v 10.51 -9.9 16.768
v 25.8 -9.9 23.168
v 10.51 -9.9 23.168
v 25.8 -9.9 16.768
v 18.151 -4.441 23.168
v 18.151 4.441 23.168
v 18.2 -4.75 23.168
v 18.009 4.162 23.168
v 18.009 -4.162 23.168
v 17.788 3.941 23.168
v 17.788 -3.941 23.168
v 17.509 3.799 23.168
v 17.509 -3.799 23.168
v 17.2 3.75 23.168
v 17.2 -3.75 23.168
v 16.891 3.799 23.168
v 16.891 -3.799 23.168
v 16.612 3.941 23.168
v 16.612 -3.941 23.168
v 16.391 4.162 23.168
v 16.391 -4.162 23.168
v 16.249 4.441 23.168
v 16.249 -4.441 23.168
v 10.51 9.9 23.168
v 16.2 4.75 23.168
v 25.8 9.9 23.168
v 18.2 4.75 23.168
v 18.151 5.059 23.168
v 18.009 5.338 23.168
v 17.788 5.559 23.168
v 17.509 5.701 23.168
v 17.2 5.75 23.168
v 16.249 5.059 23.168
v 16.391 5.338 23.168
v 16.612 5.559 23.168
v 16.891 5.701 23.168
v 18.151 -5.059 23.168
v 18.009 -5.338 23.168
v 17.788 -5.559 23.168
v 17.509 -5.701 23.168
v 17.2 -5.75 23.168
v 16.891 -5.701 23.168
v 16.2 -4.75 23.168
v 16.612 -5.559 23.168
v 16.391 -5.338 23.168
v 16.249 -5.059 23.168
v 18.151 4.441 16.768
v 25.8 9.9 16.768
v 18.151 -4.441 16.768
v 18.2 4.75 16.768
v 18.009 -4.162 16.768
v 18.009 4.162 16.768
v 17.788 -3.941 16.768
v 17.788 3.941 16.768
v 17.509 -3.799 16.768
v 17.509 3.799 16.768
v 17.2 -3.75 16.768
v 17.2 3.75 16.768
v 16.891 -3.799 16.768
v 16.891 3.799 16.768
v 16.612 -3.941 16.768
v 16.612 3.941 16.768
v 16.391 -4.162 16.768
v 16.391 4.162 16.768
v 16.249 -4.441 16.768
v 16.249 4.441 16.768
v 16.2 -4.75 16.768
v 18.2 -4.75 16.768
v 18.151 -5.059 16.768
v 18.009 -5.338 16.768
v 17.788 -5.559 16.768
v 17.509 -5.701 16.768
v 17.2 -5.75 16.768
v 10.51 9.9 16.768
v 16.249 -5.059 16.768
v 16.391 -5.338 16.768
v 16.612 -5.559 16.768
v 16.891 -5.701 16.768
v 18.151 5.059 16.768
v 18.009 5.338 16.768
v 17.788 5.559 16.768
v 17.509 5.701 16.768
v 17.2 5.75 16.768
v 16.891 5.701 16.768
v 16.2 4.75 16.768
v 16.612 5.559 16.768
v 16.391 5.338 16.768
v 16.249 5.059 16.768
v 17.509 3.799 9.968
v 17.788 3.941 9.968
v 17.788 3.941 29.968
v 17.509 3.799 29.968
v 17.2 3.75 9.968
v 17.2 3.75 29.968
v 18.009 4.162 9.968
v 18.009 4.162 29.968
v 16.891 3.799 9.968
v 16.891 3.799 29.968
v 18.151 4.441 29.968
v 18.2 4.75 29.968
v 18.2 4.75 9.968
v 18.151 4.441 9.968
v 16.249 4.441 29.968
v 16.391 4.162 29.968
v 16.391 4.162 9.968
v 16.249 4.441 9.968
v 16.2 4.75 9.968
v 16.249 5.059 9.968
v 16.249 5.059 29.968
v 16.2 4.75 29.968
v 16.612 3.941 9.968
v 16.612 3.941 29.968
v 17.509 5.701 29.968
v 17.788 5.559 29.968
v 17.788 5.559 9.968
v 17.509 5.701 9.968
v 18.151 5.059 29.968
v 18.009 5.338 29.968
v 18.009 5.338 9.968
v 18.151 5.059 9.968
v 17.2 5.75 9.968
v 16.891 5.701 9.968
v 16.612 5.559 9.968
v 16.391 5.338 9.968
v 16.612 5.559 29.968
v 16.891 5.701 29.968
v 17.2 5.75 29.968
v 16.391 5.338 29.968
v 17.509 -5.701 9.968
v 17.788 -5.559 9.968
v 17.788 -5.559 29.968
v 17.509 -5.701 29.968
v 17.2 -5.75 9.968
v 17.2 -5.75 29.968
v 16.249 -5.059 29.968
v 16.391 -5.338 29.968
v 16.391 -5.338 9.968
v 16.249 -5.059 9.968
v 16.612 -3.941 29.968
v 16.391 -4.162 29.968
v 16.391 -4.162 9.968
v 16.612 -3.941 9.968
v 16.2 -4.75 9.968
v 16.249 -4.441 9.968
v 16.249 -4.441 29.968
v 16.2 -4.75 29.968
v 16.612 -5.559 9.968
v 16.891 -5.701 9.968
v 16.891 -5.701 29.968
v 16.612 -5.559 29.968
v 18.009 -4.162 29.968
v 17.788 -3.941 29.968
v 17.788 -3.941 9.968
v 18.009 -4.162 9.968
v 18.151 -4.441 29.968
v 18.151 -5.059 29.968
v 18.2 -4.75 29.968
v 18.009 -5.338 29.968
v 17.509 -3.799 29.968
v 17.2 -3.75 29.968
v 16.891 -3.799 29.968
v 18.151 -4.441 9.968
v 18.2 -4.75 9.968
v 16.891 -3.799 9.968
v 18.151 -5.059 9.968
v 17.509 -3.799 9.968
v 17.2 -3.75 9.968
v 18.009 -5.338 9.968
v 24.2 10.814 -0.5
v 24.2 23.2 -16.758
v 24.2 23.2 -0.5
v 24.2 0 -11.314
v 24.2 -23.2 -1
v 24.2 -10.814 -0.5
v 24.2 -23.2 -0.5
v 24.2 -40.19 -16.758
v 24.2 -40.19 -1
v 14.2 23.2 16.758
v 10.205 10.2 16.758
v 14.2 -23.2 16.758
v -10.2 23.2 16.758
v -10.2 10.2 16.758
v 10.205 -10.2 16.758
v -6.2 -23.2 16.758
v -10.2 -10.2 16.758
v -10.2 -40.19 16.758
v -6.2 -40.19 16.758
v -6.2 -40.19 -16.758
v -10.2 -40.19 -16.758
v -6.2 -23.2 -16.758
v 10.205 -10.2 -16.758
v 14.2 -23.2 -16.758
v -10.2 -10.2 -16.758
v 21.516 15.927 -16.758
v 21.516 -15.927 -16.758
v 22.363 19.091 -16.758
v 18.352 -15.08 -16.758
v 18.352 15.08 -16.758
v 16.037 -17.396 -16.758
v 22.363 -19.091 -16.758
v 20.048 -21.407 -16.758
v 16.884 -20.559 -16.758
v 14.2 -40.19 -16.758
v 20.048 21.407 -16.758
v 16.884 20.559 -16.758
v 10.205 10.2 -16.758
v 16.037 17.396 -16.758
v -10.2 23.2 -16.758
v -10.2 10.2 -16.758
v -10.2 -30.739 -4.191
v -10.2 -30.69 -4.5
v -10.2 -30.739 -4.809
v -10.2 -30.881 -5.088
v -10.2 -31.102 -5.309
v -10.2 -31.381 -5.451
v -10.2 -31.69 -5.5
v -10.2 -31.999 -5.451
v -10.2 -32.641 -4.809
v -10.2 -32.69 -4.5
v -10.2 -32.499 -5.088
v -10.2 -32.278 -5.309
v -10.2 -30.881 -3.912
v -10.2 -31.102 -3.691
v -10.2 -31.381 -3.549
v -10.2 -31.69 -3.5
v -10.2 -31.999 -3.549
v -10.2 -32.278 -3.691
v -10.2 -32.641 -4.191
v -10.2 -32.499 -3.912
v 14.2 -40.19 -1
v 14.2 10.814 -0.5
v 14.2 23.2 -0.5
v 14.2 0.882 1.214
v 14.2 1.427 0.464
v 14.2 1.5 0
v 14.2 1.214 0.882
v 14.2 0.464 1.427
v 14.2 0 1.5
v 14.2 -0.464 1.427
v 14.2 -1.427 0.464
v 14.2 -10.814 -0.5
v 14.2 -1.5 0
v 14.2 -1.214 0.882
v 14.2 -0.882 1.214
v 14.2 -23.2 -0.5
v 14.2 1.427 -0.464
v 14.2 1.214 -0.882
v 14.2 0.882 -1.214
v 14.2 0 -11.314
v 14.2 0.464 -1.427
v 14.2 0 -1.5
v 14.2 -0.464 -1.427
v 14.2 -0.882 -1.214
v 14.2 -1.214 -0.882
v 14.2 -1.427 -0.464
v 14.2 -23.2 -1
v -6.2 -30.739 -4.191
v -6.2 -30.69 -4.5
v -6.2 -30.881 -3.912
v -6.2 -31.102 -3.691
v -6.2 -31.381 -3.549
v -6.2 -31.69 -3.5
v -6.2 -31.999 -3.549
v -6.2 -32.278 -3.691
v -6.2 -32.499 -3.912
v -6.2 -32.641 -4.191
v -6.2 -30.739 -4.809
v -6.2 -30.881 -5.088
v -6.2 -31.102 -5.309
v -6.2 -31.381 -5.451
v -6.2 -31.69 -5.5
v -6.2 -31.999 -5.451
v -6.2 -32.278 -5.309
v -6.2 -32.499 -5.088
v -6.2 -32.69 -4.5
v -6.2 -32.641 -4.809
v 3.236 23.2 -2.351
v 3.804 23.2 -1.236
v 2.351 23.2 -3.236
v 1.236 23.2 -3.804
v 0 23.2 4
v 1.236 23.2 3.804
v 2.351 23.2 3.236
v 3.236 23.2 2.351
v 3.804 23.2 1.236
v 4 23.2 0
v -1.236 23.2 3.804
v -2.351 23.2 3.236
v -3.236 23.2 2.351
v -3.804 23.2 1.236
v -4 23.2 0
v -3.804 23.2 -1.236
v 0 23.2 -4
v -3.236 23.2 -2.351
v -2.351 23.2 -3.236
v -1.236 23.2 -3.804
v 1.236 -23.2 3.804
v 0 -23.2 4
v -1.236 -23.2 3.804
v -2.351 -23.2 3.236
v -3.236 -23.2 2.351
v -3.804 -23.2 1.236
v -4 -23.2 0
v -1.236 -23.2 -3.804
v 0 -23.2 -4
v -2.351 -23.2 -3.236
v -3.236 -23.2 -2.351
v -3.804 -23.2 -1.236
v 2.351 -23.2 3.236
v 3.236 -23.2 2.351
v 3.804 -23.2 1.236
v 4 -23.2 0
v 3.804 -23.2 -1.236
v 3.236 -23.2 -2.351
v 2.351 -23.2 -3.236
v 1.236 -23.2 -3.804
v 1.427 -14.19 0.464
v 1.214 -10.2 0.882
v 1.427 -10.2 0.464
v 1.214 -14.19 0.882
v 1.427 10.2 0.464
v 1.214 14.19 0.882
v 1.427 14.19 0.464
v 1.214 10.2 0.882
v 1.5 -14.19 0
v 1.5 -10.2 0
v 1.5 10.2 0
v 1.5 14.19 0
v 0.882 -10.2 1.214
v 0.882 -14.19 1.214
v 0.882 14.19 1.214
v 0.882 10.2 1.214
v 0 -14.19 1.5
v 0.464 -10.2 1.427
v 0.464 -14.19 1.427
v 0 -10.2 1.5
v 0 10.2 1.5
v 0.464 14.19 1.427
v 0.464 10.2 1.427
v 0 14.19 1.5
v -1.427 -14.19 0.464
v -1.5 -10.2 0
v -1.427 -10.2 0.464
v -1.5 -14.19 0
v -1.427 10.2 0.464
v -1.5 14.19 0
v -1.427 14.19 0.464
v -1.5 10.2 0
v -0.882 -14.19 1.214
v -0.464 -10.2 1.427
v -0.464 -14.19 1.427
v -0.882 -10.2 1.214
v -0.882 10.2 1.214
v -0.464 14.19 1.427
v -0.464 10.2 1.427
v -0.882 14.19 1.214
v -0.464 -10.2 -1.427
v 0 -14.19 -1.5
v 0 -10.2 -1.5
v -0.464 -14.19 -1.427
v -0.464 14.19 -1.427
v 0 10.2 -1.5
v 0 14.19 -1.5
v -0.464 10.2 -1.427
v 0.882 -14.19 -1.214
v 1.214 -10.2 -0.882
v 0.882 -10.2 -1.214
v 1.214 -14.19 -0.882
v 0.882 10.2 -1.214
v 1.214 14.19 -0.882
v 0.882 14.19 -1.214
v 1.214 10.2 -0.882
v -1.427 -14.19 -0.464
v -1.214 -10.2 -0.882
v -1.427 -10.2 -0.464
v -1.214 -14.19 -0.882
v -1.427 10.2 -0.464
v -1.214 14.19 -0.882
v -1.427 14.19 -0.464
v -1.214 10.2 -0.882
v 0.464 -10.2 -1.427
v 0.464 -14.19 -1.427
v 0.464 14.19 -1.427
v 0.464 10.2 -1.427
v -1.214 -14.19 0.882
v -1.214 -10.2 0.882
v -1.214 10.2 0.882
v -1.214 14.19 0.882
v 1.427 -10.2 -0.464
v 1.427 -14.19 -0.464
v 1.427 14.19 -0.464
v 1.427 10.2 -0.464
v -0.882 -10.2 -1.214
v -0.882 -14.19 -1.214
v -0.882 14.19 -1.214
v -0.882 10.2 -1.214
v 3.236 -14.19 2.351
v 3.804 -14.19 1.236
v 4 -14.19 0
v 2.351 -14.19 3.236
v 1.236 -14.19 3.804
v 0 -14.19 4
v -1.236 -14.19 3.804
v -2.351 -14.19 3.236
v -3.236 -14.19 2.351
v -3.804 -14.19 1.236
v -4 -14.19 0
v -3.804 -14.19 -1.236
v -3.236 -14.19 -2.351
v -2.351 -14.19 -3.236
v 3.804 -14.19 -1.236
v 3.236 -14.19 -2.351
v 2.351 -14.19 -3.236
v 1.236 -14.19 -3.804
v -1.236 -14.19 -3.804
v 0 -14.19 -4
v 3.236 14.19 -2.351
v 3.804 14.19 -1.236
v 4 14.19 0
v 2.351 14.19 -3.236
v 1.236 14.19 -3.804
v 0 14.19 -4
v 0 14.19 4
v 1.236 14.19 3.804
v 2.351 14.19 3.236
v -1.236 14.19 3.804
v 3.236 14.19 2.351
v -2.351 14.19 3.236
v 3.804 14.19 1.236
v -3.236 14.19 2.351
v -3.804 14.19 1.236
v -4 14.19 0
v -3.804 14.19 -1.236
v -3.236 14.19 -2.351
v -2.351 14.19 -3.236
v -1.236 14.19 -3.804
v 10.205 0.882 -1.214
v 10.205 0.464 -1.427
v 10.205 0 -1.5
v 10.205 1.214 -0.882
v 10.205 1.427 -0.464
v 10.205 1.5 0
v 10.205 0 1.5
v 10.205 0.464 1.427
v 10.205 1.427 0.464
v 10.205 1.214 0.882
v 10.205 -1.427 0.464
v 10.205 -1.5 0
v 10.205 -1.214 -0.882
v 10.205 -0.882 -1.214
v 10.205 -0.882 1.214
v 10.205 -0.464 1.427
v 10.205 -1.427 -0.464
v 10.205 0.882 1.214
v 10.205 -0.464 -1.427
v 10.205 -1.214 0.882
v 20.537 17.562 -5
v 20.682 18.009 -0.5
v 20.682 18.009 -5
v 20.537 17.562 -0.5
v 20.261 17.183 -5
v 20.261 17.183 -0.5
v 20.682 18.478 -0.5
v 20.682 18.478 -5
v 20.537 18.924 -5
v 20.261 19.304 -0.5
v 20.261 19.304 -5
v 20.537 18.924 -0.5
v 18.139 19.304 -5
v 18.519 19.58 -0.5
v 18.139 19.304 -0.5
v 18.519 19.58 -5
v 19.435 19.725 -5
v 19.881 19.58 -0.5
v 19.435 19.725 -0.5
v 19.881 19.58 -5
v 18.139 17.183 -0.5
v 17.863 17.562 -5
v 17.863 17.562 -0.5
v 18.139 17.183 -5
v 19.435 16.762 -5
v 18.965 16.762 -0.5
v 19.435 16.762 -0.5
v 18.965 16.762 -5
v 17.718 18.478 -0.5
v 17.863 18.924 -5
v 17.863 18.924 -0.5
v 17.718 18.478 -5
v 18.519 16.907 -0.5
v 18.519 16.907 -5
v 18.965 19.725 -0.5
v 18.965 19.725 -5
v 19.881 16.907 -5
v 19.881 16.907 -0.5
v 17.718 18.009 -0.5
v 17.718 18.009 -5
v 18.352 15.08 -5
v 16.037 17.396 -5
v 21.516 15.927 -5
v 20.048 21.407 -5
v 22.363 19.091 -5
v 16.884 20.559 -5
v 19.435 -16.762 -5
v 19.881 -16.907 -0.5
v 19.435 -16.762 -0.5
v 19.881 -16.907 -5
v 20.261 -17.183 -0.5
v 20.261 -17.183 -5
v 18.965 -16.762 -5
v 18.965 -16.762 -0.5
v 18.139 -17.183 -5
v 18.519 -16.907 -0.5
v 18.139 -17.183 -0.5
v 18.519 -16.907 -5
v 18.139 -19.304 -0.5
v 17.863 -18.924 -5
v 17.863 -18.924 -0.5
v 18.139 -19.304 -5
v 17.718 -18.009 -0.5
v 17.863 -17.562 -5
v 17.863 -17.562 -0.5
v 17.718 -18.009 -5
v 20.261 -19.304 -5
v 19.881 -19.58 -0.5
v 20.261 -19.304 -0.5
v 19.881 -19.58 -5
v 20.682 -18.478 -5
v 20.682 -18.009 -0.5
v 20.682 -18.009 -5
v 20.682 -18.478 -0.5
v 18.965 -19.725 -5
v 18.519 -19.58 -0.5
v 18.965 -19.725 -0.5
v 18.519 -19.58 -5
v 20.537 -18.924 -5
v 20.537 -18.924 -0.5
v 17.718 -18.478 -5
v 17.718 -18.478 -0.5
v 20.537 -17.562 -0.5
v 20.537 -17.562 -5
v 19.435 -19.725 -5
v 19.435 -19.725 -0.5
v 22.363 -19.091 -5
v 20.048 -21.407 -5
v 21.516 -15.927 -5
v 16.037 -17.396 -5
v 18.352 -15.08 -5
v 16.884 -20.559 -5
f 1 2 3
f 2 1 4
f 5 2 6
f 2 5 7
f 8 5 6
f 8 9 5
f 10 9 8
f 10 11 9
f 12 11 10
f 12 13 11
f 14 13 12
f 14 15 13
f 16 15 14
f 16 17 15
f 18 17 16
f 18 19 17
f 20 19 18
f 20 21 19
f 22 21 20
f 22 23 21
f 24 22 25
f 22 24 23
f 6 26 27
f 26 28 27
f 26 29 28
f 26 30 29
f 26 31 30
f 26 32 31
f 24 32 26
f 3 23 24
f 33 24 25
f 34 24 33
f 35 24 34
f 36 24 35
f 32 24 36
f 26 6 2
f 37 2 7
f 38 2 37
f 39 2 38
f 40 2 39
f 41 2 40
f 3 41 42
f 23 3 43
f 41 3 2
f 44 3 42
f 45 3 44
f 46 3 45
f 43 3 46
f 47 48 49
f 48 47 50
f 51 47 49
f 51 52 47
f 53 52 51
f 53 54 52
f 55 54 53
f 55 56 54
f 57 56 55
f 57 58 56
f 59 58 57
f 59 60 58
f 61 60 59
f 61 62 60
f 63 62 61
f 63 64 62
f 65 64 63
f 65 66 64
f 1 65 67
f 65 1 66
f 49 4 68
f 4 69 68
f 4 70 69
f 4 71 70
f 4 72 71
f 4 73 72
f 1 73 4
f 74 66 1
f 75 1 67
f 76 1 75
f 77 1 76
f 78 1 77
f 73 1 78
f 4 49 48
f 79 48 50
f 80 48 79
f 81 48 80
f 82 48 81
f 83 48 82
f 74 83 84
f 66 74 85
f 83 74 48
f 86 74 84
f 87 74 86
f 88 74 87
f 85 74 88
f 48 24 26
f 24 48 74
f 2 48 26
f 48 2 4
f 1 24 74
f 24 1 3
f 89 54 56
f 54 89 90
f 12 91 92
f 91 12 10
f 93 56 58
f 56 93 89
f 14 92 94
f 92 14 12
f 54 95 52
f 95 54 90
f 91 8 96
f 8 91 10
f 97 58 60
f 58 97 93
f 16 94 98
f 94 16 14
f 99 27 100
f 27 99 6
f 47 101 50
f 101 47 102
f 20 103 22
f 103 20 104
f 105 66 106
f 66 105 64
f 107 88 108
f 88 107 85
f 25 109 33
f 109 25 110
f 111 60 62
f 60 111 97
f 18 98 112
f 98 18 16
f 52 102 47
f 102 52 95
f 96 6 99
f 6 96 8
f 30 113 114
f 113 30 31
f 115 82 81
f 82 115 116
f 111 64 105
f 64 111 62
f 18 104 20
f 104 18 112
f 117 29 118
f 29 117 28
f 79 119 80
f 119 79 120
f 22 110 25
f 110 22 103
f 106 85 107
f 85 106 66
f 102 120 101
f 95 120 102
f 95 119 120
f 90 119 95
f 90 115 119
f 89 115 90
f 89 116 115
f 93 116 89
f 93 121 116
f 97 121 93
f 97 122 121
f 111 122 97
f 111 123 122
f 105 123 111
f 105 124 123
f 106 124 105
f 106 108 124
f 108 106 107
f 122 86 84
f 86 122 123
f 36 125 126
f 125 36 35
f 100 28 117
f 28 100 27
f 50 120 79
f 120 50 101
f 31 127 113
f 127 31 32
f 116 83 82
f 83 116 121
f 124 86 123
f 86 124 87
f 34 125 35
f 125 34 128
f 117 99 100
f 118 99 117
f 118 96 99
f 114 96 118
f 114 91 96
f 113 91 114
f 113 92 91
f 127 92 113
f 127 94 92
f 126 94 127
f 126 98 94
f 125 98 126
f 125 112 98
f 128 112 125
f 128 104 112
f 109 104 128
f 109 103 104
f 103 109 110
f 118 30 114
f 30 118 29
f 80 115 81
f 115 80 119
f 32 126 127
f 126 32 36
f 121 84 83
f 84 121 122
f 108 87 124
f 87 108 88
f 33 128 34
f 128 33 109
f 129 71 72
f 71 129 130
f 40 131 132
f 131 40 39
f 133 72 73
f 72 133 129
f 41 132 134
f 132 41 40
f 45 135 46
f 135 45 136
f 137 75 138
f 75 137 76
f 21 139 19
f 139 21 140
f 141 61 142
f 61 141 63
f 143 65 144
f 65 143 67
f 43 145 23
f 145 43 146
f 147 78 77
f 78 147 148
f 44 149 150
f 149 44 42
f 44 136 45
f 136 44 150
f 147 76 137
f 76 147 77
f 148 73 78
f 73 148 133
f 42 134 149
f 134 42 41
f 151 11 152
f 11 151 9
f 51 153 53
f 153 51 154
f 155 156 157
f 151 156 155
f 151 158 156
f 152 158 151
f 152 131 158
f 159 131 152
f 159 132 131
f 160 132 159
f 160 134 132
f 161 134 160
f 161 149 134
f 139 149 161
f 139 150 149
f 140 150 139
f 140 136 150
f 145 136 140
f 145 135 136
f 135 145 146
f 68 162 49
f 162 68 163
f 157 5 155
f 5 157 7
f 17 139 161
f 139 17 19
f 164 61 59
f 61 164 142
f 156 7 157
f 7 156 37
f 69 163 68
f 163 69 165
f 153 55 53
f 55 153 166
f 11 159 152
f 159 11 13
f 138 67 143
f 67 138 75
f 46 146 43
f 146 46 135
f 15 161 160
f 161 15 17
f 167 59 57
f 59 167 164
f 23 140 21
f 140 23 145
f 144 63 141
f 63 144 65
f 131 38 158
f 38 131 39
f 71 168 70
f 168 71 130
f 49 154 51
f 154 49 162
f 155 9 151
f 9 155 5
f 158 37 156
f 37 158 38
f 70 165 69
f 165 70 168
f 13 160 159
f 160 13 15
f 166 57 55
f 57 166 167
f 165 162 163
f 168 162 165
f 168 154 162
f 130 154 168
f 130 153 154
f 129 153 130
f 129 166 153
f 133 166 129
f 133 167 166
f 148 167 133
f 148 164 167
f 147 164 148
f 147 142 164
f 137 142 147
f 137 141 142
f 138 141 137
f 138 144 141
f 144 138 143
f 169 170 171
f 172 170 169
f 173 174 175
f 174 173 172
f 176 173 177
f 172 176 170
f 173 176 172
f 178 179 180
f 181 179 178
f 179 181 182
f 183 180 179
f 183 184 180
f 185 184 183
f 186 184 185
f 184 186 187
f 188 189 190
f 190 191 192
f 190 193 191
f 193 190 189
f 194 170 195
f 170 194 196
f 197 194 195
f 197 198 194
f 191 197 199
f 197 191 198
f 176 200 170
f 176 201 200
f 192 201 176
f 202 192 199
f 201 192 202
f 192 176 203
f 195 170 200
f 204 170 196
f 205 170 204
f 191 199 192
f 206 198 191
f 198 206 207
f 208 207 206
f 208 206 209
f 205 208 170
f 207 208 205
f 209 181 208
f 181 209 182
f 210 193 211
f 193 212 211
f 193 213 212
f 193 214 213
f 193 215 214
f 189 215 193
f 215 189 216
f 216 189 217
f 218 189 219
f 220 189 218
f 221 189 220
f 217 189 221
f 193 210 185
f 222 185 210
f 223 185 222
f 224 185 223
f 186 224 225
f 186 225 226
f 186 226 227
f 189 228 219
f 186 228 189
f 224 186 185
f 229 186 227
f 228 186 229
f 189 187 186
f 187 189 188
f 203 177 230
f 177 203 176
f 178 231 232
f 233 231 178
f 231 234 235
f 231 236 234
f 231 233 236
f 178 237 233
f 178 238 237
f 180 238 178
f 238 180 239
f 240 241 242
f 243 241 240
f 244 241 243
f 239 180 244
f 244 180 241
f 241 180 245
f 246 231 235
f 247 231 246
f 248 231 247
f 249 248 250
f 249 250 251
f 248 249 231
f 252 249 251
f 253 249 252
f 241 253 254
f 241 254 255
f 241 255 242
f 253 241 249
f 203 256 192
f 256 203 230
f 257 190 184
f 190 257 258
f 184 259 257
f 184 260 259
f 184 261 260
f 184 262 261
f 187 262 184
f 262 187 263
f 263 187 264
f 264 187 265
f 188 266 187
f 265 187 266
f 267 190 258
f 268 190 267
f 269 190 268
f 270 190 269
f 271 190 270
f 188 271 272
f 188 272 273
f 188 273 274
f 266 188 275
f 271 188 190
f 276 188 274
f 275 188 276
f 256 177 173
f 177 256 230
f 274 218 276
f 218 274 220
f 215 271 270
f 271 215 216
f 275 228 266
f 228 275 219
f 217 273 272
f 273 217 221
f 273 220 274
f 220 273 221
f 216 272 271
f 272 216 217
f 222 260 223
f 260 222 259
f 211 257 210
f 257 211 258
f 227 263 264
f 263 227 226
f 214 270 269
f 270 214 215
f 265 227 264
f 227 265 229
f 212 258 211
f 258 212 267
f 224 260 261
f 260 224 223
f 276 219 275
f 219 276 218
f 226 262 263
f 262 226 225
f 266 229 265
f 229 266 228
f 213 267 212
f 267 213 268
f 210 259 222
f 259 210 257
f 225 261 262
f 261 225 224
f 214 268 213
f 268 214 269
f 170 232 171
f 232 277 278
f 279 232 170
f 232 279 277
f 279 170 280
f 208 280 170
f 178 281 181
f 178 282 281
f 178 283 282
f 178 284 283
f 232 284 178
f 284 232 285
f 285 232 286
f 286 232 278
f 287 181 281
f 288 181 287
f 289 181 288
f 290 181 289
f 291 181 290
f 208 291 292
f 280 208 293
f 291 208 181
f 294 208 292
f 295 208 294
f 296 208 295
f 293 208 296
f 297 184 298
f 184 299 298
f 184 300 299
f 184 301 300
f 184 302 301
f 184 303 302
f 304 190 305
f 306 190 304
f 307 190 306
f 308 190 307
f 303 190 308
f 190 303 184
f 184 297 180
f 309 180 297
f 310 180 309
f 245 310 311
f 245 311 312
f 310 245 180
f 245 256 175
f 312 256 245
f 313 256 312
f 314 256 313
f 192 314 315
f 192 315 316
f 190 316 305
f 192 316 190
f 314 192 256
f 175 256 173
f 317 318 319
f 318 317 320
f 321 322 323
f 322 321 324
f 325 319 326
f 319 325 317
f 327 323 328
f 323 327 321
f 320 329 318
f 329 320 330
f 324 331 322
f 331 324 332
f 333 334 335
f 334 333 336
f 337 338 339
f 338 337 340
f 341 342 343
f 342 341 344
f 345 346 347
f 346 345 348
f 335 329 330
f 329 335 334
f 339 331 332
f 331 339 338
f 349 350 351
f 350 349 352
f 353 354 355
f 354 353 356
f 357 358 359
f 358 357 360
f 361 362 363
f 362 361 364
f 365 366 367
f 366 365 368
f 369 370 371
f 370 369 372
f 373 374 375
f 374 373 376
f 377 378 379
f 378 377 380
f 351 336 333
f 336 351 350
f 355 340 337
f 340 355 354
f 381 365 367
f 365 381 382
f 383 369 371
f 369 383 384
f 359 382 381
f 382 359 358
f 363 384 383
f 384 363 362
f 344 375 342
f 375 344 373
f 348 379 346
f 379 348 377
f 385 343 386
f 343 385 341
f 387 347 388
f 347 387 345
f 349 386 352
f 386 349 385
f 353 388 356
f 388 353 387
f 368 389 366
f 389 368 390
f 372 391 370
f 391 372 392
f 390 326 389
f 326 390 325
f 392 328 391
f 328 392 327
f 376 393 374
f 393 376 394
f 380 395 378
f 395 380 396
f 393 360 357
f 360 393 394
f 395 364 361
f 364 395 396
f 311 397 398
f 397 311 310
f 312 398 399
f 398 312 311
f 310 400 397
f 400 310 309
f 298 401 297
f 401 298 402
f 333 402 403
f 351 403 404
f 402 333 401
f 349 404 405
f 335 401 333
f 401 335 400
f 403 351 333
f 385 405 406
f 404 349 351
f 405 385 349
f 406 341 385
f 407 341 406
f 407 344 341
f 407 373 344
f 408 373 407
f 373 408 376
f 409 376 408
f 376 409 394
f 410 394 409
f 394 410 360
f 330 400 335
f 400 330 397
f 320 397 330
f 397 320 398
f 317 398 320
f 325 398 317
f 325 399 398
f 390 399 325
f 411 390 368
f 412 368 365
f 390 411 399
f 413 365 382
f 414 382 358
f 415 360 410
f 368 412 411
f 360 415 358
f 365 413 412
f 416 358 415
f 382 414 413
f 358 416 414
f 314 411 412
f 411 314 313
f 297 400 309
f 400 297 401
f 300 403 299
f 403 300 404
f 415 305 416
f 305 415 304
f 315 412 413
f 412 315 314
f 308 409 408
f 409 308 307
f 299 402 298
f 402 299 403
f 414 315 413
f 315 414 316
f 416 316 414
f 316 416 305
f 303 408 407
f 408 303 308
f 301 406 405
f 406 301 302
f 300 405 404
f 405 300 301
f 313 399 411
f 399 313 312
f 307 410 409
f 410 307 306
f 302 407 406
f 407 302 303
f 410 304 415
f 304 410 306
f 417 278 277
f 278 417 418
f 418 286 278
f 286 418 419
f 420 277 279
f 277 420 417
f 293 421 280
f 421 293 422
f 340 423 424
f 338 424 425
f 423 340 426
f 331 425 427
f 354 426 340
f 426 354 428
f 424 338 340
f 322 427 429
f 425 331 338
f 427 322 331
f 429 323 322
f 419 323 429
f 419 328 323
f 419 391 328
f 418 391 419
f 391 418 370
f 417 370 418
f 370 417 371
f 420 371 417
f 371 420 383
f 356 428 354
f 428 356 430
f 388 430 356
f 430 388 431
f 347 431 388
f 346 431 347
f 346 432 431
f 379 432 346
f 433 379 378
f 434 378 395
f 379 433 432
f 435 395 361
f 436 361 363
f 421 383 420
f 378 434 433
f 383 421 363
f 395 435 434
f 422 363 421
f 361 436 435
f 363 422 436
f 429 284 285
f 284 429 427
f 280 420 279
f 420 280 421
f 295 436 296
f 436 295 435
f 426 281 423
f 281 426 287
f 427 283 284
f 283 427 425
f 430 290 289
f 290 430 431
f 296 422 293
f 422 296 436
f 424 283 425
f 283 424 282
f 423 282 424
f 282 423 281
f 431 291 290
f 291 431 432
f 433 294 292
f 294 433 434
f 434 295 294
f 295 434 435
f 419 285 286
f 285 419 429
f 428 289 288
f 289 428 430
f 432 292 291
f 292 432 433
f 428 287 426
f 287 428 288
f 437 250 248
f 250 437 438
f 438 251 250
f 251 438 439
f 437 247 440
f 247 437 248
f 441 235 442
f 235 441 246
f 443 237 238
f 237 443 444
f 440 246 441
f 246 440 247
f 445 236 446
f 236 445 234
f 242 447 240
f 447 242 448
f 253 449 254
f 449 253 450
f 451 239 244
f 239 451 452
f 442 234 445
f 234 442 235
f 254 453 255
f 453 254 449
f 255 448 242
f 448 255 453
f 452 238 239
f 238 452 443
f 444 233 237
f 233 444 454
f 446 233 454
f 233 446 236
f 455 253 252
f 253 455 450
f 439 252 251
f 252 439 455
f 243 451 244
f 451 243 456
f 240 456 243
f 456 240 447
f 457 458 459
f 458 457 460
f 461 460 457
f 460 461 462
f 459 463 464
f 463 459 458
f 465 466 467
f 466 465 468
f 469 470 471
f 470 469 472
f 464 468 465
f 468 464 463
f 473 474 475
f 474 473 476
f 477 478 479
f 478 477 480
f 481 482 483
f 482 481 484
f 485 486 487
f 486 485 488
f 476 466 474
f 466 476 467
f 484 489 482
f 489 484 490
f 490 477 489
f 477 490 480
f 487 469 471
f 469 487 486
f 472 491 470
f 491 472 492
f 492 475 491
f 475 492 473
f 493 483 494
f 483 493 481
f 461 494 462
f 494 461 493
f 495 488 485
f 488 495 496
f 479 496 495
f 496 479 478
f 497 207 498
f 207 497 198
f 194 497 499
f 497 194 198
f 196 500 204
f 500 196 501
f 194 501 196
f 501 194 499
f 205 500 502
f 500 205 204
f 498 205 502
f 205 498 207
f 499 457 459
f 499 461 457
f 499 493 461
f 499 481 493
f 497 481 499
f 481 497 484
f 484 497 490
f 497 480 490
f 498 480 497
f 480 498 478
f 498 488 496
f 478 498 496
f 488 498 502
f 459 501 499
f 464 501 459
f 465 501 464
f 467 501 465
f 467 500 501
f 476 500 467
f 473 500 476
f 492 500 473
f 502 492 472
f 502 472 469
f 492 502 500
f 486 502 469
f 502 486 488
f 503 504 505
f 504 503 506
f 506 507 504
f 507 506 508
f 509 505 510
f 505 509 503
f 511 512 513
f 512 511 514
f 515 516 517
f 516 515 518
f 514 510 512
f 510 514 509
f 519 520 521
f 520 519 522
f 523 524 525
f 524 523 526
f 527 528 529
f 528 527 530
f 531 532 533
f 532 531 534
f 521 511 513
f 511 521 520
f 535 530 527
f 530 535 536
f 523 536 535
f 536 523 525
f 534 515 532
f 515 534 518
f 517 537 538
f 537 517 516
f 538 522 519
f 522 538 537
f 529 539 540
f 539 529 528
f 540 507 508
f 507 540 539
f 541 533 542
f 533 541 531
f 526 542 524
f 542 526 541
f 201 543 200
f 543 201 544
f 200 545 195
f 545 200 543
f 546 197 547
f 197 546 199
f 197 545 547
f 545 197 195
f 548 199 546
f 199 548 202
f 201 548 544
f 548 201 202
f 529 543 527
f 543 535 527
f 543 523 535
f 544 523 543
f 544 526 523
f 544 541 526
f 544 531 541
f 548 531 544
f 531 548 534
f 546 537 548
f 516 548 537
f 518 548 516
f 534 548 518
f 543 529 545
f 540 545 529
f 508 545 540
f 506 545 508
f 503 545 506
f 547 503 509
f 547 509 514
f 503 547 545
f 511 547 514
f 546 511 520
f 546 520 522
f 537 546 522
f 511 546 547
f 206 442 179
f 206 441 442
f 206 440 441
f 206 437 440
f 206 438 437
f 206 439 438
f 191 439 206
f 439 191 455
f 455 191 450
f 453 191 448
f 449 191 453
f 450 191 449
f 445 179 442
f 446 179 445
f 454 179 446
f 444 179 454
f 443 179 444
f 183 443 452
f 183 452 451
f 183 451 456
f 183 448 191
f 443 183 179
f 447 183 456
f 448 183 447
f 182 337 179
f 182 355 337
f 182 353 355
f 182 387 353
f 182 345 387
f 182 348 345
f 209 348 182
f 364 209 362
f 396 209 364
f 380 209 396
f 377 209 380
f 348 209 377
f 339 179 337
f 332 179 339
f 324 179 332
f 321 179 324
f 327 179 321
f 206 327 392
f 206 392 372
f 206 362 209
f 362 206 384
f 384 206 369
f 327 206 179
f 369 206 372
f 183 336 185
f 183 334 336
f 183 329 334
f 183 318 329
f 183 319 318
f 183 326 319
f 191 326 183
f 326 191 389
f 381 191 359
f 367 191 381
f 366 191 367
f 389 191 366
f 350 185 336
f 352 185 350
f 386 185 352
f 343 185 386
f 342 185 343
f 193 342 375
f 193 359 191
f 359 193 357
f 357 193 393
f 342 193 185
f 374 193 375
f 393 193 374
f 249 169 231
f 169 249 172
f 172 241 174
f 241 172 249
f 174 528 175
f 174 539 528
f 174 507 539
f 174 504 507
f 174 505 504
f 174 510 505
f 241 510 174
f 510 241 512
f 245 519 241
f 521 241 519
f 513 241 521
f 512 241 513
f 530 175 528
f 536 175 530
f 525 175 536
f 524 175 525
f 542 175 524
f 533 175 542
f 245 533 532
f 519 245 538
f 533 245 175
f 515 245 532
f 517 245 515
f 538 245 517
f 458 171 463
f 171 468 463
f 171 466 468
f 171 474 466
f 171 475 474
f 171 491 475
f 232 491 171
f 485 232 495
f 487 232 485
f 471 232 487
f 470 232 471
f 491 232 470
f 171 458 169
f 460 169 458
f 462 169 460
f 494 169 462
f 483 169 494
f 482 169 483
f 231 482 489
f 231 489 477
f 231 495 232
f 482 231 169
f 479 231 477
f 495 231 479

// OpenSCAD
// file: ../../../parts/switch.scad
/*
    SWITCH
*/

switch_x = 19.8;
switch_y = 11.5;
switch_y_total = 15.3;
switch_z = 6.4;
switch_diameter = 2; // 2.5

module switch() {
	
	//difference() {
		
		union() {
				
			translate([0, (switch_y / 2) - 2.9, 0])
			cube([switch_x, switch_y, switch_z], center = true);
			
			switch_pin_y = switch_y_total - switch_y;
			color([0, 1, 0, 0.7])
			translate([0, -(switch_pin_y / 2) - 2.9 + 0.01, 0])
			cube([switch_x, switch_pin_y, switch_z], center = true);
		}
		
		color([1, 0, 0, 0.7])
		union() {
			translate([-9.5 / 2, 0, 0])
			cylinder (r=(switch_diameter / 2), h=20 , center=true);
			translate([ 9.5 / 2, 0, 0])
			cylinder (r=(switch_diameter / 2), h=20 , center=true);
		}
	//}
}
// ss-5gl
// file: ../../config.scad
include <../parts/switch.scad>


rod_side = 16;
rod_length = 700;

rod_horizontal_spacing	= 120; // center to center / min 105
rod_vertical_spacing	= 2;

bearing_outer_diameter = 10;
bearing_inner_diameter = 3;
bearing_height = 4;

    // avoid touching this except if you know what's you're doing
    
bearing_holder_spacing_1 = 0.7; // space between bearing flat sides and piece
bearing_holder_spacing_2 = 1; // space between bearing perimeter and piece
bearing_holder_width = 3; // thickness of pieces holding the bearings
bearing_screw_access_size = 10; // the size of the cube to remove to be able to put in place the bearing screw

screw_exceed = 3; // how much you want a screew can exceed in length
    // default M3 screws size
screw_diameter = 3; // the diameter of your screws
    // default M3 nuts size
screws_nuts_side_min = 5.75; // 5.4min
screws_nuts_side_max = 6.55; // default is 6mm but we add some margin
screw_nuts_height = 3; // default is 2.4mm
screws_material_holder_min_size = 3; // the minimum of material arround a screw
screws_attach_length = 10; // the min length of the screew which will attach the 2 pieces

rod_holder_size = 10; // the length of material which will tighten the carriage rods => 10 for Y, 7 for X

rod_piece_spacing = 1; // space between rod and piece
   
pieces_spacing = 1; // the space between the 2 pieces

motor_holder_thickness = 4; // thickness of motor support


/*
    Computed variables for future use
*/

rod_remove_side = rod_side + (rod_piece_spacing * 2);

    // represent the min size of material which should warp a screw
screw_virtual_holder_side = screw_diameter + (screws_material_holder_min_size * 2);

	// represent the area taken by bearings
bearing_virtual_cube_side = (((rod_side / 2) + bearing_outer_diameter + (bearing_height / 2) + bearing_holder_spacing_1 + bearing_holder_width) / sqrt(2)) * 2;

    // the outers screews could touch the rod, so we need to compute an offset
space_rod_outer = (bearing_virtual_cube_side - (rod_remove_side * sqrt(2))) / 2; // the minimum must be screw_virtual_holder_side
echo("space_rod_outer", space_rod_outer);
outer_screw_offset = abs(screw_virtual_holder_side - space_rod_outer);

	// base piece size
base_block_x = rod_horizontal_spacing + (rod_side * sqrt(2)) + (screw_virtual_holder_side * 2);  
base_block_y = bearing_virtual_cube_side + rod_holder_size /*+ screw_virtual_holder_side*/ + outer_screw_offset;
base_block_z = max(bearing_virtual_cube_side, rod_remove_side * sqrt(2) + motor_holder_thickness * 2);


 base_block_remove_x = rod_horizontal_spacing - (rod_side * sqrt(2)) - (screw_virtual_holder_side * 2);
base_block_remove_y = base_block_y;
base_block_remove_z = max(rod_remove_side * sqrt(2), base_block_z - (motor_holder_thickness * 2));



/*
    RODS
*/

module rod(show_rods) {
    if(show_rods) {
        color([0.7, 0.7, 0.7])
        rotate([45, 0, 0])
        cube([rod_length, rod_side, rod_side], center = true);
    }
}
// draw a rod


module screw() {
    screw_height = 50;
    cylinder (r=(screw_diameter / 2), h=screw_height , center=true);
}




module base_screw_remove_tighten() {
    
    
    color([1, 0, 0, 0.7])
    union() {
        
        screw_length = base_block_z + 1;
        
        cylinder (r=(screw_diameter / 2), h=screw_length, center=true);
    
        nuts_remove_length = (screw_length / 2) - (screws_attach_length / 2);
    
        translate([0, 0, (screw_length / 2) - (nuts_remove_length / 2)])
        cylinder ($fn = 6, r=(screws_nuts_side_max / 2), h=nuts_remove_length, center=true);
        
        translate([0, 0, -((screw_length / 2) - (nuts_remove_length / 2))])
        cylinder ($fn = 6, r=(screws_nuts_side_max / 2), h=nuts_remove_length, center=true);
    }
}
// base_screw_remove_tighten



/*
    SWITCH
*/

switch_x = 19.8;
switch_y = 11.5;
switch_y_total = 15.3;
switch_z = 6.4;
switch_diameter = 2; // 2.5

module switch() {
	
	//difference() {
		
		union() {
				
			translate([0, (switch_y / 2) - 2.9, 0])
			cube([switch_x, switch_y, switch_z], center = true);
			
			switch_pin_y = switch_y_total - switch_y;
			color([0, 1, 0, 0.7])
			translate([0, -(switch_pin_y / 2) - 2.9 + 0.01, 0])
			cube([switch_x, switch_pin_y, switch_z], center = true);
		}
		
		color([1, 0, 0, 0.7])
		union() {
			translate([-9.5 / 2, 0, 0])
			cylinder (r=(switch_diameter / 2), h=20 , center=true);
			translate([ 9.5 / 2, 0, 0])
			cylinder (r=(switch_diameter / 2), h=20 , center=true);
		}
	//}
}
// ss-5gl
// main file
$fn=20;

include <../../config.scad>

frame_rod_side = 20.4;
material_thickness_frame_rod = 4;


base_x = frame_rod_side + material_thickness_frame_rod + rod_holder_size;
base_y = frame_rod_side + (material_thickness_frame_rod * 2) + (screw_virtual_holder_side * 2);
base_z = base_block_z;

base_x_offset = (base_x / 2) - (frame_rod_side / 2);

base_belt_holder_block_y = 17;
base_belt_holder_block_offset_y = (base_y / 2) + (base_belt_holder_block_y / 2);

base_belt_holder_block_remove_x = frame_rod_side;
base_belt_holder_block_remove_z = 50;
base_belt_holder_block_remove_offset_x = material_thickness_frame_rod;


module frame_rod() {
	color([0.7, 0.7, 0.7])
	cube([frame_rod_side + 0.01, frame_rod_side, 500], center = true);
}
// frame_rod

module positioned_rod() {
	translate([(rod_length / 2) + (frame_rod_side / 2) + material_thickness_frame_rod, 0, 0])
	rod(true);
}
// positioned_rod

module screw_and_head(screw_height) {
	screw_head_diameter = 8;
	
	color([1, 0, 0, 0.7])
	union() {
		translate([0, 0, -(screw_height / 2)])
		cylinder (r=(screw_diameter / 2), h=screw_height , center=true);
		translate([0, 0, (screw_height / 2) - 0.01])
		cylinder (r=(screw_head_diameter / 2), h=screw_height , center=true);
	}
}
// screw_and_head


module screw_holes() {
	screw_hole_offset = frame_rod_side / 2 + material_thickness_frame_rod;
	
	translate([0, -screw_hole_offset, 0])
	rotate([90, 0, 0])
	screw_and_head(20);
	
	translate([0, screw_hole_offset, 0])
	rotate([-90, 0, 0])
	screw_and_head(20);
	
	translate([screw_hole_offset + 0.1, 0, 0])
	rotate([0, 90, 0])
	screw_and_head(20);
}
// screw_holes


module base_screw_remove_tighten() {
    
    
    color([1, 0, 0, 0.7])
    union() {
        
        screw_length = base_block_z + 1;
        
        cylinder (r=(screw_diameter / 2), h=screw_length, center=true);
    
        nuts_remove_length = (screw_length / 2) - (screws_attach_length / 2);
    
        translate([0, 0, (screw_length / 2) - (nuts_remove_length / 2)])
        cylinder ($fn = 6, r=(screws_nuts_side_max / 2), h=nuts_remove_length, center=true);
        
        translate([0, 0, -((screw_length / 2) - (nuts_remove_length / 2))])
        cylinder ($fn = 6, r=(screws_nuts_side_max / 2), h=nuts_remove_length, center=true);
    }
}
// base_screw_remove_tighten

module positioned_base_screw_remove_tighten() {
    base_screw_remove_tighten_x = (frame_rod_side / 2) + material_thickness_frame_rod + (rod_holder_size / 2);
    base_screw_remove_tighten_y = (base_block_y / 2) - (screw_virtual_holder_side / 2) - 1.5;
    

    translate([base_screw_remove_tighten_x, 0, 0])
    union() {
        translate([0, base_screw_remove_tighten_y, 0])
        rotate([0, 0, -45 ])
        base_screw_remove_tighten();
		
		translate([0, -base_screw_remove_tighten_y, 0])
        rotate([0, 0, +45 ])
        base_screw_remove_tighten();
    }
}
// positioned_base_screw_remove_tighten



module positioned_switch() {
	switch_offset_x = (frame_rod_side / 2) + material_thickness_frame_rod + 3;
	switch_offset_z = (base_z / 2) + (switch_z / 2);
	
	translate([switch_offset_x, 0, switch_offset_z + 0.01])
	rotate([0, 0, -90])
	switch();
}
// positioned_switch
positioned_switch();


module base_block_separator() {
	base_block_separator_offset_x = frame_rod_side / 2 + material_thickness_frame_rod + rod_holder_size;
	translate([base_block_separator_offset_x, 0, 0])
	cube([rod_holder_size * 2, 100, 1], center = true);
}
// base_block_separator

module base_block_spliter() {
	base_block_spliter_z = 50;
	
	base_block_separator_offset_x = frame_rod_side / 2 + material_thickness_frame_rod + rod_holder_size;
	color([0, 0, 1, .7])
	translate([base_block_separator_offset_x, 0, base_block_spliter_z / 2])
	cube([rod_holder_size * 2, 100, base_block_spliter_z], center = true);
}
// base_block_spliter


/*
    BELT HOLDER
*/

module base_belt_holder_block_belt_remove() {
	base_belt_holder_block_belt_remove_x = rod_holder_size * 2;
	base_belt_holder_block_belt_remove_y = base_belt_holder_block_y * 2;
	
	base_belt_holder_block_belt_remove_offset_x = (frame_rod_side /2) + material_thickness_frame_rod + (rod_holder_size / 2);
	
	translate([base_belt_holder_block_belt_remove_offset_x, -(base_belt_holder_block_y / 2) + 0.01, 0])
	cube([base_belt_holder_block_belt_remove_x, base_belt_holder_block_belt_remove_y, 2], center = true);
}
// base_belt_holder_block_belt_remove

module base_belt_holder_block_screw_remove() {
	screw_m2_diameter = 2;
	screw_m2_offset_x = -(frame_rod_side / 2) + (material_thickness_frame_rod / 2);
	
	translate([screw_m2_offset_x, 0, -4.5])
	rotate([0, 90, 0])
	cylinder (r=(screw_m2_diameter / 2), h=20 , center=true);
}
// base_belt_holder_block_screw_remove

module base_belt_holder_block_remove() {
	
	translate([base_belt_holder_block_remove_offset_x, 0, 0])
	cube([base_belt_holder_block_remove_x, base_belt_holder_block_y + 0.01, base_belt_holder_block_remove_z], center = true);
}
// base_belt_holder_block_remove

module base_belt_holder_block() {
	color([1, 0.5, 0, 0.7])
	translate([base_x_offset, 0, 0])
	cube([base_x, base_belt_holder_block_y, base_z], center = true);
}
// base_belt_holder_block


module base_belt_holder_block_full() {
	translate([0, -base_belt_holder_block_offset_y + 0.01, 0])
	difference() {
		union() {
			base_belt_holder_block();
		}
		
		base_belt_holder_block_remove();
		base_belt_holder_block_belt_remove();
		base_belt_holder_block_screw_remove();
		
	}
}
// base_belt_holder_block_full


module base_block() {
	color([1, 1, 0, 0.7])
	translate([base_x_offset, 0, 0])
	cube([base_x, base_y, base_z], center = true);
}
// base_block





module base_block_full() {
	difference() {
		union() {	
			base_block();
			base_belt_holder_block_full();
		}
		
		union() {
			frame_rod();
			positioned_rod();
			screw_holes();
			base_block_separator();
			positioned_base_screw_remove_tighten();
			positioned_switch();
		}
	}
}
// base_block_full

module _render() {
	difference() { // difference, intersection
		base_block_full();
		base_block_spliter();
	}

}
// _render

_render();
